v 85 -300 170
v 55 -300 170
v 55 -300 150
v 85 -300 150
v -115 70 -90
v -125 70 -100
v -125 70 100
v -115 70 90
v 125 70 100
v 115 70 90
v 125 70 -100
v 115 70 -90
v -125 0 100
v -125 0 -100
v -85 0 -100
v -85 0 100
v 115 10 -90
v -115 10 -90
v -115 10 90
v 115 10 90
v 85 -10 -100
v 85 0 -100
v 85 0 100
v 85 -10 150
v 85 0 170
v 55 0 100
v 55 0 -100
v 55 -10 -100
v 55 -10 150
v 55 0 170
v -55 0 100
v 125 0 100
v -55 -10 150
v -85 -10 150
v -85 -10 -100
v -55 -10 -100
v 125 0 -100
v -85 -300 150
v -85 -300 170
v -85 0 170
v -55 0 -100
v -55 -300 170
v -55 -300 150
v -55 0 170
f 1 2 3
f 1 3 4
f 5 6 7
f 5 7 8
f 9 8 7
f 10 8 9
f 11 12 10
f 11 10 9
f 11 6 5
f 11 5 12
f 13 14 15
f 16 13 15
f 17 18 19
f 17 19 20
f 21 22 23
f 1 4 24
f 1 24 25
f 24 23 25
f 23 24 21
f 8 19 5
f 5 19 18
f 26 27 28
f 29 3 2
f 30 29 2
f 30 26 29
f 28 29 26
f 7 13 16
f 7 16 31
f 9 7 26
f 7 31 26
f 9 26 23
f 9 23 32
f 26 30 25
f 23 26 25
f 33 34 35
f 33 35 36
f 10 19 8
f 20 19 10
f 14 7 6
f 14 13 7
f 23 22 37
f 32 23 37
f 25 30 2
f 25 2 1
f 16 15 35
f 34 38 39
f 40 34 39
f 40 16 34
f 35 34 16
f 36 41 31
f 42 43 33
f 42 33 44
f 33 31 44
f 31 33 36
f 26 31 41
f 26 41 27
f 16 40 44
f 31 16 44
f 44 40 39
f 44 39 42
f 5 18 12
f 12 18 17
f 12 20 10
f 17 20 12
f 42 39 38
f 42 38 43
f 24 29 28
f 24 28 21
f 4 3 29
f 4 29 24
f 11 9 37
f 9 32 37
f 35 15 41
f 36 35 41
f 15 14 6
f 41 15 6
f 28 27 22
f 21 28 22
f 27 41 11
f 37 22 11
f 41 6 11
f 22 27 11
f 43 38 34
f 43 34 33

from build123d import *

# Parameters (mm, degrees)
CROQUIS1_W              = 250
CROQUIS1_H              = 200
SALIENTE_EXTRUIR1_DEPTH = 10
CROQUIS2_W              = 250
CROQUIS2_H              = 200
CROQUIS2_W_2            = 230
CROQUIS2_H_2            = 180
SALIENTE_EXTRUIR2_DEPTH = 60
CROQUIS3_W              = 30
CROQUIS3_H              = 270
SALIENTE_EXTRUIR3_DEPTH = 10
CROQUIS4_W              = 30
CROQUIS4_H              = 20
SALIENTE_EXTRUIR4_DEPTH = 290


with BuildPart() as part:
    # Croquis1 → Saliente-Extruir1 (new body)
    with BuildSketch(Plane(origin=(0, 0, 0), x_dir=(1, 0, 0), z_dir=(0, 1, 0))):
        Rectangle(CROQUIS1_W, CROQUIS1_H)
    extrude(amount=SALIENTE_EXTRUIR1_DEPTH)

    # Croquis2 → Saliente-Extruir2 (add)
    with BuildSketch(Plane(origin=(0, 10, 0), x_dir=(1, 0, 0), z_dir=(0, 1, 0))):
        Rectangle(CROQUIS2_W, CROQUIS2_H)
        Rectangle(CROQUIS2_W_2, CROQUIS2_H_2, mode=Mode.SUBTRACT)
    extrude(amount=SALIENTE_EXTRUIR2_DEPTH)

    # Croquis3 → Saliente-Extruir3 (add)
    with BuildSketch(Plane.XZ):
        with Locations((-70, 35)):
            Rectangle(CROQUIS3_W, CROQUIS3_H)
        with Locations((70, 35)):
            Rectangle(CROQUIS3_W, CROQUIS3_H)
    extrude(amount=SALIENTE_EXTRUIR3_DEPTH)

    # Croquis4 → Saliente-Extruir4 (add)
    with BuildSketch(Plane.XZ.offset(10)):
        with Locations((-70, 160)):
            Rectangle(CROQUIS4_W, CROQUIS4_H)
        with Locations((70, 160)):
            Rectangle(CROQUIS4_W, CROQUIS4_H)
    extrude(amount=SALIENTE_EXTRUIR4_DEPTH)


solid = part.part
